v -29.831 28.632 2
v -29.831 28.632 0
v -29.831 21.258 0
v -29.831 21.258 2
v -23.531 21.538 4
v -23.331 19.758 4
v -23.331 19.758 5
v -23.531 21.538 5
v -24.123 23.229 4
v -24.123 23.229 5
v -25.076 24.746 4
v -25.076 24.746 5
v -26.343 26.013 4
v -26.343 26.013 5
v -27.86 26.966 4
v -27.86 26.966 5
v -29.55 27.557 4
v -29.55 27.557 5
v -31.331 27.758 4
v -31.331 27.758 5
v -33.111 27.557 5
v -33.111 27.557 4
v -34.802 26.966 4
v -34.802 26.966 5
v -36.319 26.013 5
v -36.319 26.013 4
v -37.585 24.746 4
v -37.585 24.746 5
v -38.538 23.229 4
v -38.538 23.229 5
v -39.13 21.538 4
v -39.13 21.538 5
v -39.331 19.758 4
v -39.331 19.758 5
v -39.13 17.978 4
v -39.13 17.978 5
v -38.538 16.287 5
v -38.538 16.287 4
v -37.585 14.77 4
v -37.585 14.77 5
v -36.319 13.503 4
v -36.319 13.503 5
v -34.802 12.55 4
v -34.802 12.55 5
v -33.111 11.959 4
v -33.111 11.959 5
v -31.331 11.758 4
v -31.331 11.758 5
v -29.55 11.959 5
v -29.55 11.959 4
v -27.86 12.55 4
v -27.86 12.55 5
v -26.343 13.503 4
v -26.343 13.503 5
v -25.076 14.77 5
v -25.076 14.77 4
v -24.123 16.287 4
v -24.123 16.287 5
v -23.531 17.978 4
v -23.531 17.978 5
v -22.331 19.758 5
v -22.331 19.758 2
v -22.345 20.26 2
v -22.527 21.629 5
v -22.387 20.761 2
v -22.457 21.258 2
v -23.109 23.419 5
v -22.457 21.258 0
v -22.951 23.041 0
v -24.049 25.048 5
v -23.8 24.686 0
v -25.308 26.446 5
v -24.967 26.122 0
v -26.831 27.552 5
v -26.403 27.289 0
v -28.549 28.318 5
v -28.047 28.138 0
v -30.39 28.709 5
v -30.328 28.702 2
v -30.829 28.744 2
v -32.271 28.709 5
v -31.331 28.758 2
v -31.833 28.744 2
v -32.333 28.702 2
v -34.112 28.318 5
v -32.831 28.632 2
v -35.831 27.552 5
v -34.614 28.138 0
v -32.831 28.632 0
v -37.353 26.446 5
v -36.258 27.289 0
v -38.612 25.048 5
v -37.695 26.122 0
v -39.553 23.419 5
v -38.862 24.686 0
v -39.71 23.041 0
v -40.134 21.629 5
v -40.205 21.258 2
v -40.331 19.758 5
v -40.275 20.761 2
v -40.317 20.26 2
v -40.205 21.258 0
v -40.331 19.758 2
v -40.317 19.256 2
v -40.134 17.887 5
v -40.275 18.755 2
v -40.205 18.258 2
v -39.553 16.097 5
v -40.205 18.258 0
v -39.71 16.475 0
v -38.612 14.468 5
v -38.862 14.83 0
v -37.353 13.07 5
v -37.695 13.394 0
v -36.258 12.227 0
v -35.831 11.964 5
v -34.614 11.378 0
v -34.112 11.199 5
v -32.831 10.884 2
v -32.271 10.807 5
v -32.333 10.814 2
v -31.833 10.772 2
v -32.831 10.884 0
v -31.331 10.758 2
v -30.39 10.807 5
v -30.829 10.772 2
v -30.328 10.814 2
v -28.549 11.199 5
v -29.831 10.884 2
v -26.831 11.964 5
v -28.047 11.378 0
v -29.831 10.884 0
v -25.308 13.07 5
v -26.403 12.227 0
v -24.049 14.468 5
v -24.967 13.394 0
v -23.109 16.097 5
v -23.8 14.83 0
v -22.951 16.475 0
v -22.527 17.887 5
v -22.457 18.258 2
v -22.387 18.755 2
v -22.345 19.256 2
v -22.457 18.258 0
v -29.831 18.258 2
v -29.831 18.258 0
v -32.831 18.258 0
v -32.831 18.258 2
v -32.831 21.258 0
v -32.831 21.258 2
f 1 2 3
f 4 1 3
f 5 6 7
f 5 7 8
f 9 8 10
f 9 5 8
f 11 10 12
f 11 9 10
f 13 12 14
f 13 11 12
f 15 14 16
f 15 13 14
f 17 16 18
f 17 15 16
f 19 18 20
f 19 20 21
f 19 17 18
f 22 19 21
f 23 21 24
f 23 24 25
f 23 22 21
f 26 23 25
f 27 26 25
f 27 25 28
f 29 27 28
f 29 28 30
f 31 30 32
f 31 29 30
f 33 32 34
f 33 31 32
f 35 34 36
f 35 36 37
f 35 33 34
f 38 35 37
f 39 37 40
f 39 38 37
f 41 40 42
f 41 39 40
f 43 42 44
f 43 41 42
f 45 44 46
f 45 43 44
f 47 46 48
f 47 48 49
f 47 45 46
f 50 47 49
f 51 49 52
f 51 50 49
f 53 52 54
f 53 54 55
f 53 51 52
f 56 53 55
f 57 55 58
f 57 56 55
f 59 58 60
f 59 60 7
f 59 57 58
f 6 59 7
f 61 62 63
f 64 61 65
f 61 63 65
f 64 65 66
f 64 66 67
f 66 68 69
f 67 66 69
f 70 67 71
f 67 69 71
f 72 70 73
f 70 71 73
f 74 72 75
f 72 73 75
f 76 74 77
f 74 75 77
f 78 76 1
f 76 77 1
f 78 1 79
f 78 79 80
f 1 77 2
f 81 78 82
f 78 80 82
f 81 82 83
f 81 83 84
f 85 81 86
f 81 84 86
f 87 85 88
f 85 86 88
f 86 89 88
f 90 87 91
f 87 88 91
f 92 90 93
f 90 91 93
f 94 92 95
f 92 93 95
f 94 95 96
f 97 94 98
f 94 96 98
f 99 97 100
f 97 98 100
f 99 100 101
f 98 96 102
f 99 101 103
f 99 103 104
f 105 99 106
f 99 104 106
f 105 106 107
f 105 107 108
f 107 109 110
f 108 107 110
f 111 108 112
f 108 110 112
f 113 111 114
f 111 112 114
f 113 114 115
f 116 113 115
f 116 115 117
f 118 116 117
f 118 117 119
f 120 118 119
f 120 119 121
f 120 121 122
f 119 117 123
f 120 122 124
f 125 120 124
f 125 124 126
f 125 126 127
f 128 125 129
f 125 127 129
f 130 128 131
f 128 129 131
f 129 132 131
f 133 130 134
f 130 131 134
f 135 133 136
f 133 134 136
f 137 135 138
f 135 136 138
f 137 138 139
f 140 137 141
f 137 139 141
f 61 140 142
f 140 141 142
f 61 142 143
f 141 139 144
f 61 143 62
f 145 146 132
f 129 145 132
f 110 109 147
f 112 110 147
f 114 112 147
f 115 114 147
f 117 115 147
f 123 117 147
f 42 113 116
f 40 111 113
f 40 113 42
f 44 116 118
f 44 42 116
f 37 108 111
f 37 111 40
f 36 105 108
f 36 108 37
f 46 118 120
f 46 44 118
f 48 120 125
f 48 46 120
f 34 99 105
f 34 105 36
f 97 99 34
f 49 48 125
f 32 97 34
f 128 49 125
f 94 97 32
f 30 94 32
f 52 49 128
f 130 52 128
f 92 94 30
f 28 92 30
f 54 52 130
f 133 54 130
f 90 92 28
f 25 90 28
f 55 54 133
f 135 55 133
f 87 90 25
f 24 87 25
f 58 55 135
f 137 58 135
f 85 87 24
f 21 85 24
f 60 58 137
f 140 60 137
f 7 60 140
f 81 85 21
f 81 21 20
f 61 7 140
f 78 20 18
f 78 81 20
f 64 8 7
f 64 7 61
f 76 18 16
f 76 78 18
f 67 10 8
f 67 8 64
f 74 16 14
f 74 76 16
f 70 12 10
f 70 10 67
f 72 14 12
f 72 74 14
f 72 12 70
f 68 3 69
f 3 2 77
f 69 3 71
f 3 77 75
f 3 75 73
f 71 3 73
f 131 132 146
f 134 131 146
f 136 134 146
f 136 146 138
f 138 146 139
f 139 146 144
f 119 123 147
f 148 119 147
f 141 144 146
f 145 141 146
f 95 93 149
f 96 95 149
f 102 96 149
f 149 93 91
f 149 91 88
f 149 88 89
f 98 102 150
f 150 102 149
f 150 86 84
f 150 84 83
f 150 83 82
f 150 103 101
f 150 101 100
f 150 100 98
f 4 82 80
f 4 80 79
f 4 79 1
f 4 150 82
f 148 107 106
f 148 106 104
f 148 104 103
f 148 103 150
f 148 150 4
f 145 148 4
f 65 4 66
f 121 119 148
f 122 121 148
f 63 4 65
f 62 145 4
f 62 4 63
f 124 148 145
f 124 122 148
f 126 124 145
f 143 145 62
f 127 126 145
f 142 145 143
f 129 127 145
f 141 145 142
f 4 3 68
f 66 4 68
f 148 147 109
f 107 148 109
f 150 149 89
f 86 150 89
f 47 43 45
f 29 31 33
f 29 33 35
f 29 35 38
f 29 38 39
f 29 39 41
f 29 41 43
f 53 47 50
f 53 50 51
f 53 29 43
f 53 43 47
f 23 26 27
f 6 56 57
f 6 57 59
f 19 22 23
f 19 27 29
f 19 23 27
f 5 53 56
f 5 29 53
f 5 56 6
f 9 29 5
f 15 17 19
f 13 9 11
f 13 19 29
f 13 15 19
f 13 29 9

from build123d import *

# Parameters (mm, degrees)
F0_R     = 9
F1_DEPTH = 4
F3_W     = 3
F3_H     = 3
F4_DEPTH = 2
F2_R     = 9
F2_R_2   = 8
F5_DEPTH = 1


# Not quite as in the source:
# - a feature names something its author has since deleted; it is built from what else it names


with BuildPart() as f1:
    # F0 (on Top) → F1 (new body)
    with BuildSketch(Plane.XY):
        with Locations((-31.3306450844, 19.7580661625)):
            Circle(F0_R)
    extrude(amount=F1_DEPTH)

    # F3 (on face) → F4 (cut)
    with BuildSketch(Plane(origin=(0, 0, 0), x_dir=(1, 0, 0), z_dir=(0, 0, -1))):
        with BuildLine():
            ThreePointArc((-32.8306450844, -28.6321858371), (-32.0832814269, -28.7265408676), (-31.3306450844, -28.7580661625))
            ThreePointArc((-31.3306450844, -28.7580661625), (-30.5780087419, -28.7265408676), (-29.8306450844, -28.6321858371))
            Line((-29.8306450844, -28.6321858371), (-29.8306450844, -21.2580661625))
            Line((-29.8306450844, -21.2580661625), (-32.8306450844, -21.2580661625))
            Line((-32.8306450844, -21.2580661625), (-32.8306450844, -28.6321858371))
        make_face()
        with BuildLine():
            ThreePointArc((-40.204764759, -18.2580661625), (-40.2991197895, -19.0054298199), (-40.3306450844, -19.7580661625))
            ThreePointArc((-40.3306450844, -19.7580661625), (-40.2991197895, -20.510702505), (-40.204764759, -21.2580661625))
            Line((-40.204764759, -21.2580661625), (-32.8306450844, -21.2580661625))
            Line((-32.8306450844, -21.2580661625), (-32.8306450844, -18.2580661625))
            Line((-32.8306450844, -18.2580661625), (-40.204764759, -18.2580661625))
        make_face()
        with Locations((-31.3306450844, -19.7580661625)):
            Rectangle(F3_W, F3_H)
        with BuildLine():
            Line((-29.8306450844, -18.2580661625), (-29.8306450844, -21.2580661625))
            Line((-29.8306450844, -21.2580661625), (-22.4565254097, -21.2580661625))
            ThreePointArc((-22.4565254097, -21.2580661625), (-22.3621703793, -20.510702505), (-22.3306450844, -19.7580661625))
            ThreePointArc((-22.3306450844, -19.7580661625), (-22.3621703793, -19.0054298199), (-22.4565254097, -18.2580661625))
            Line((-22.4565254097, -18.2580661625), (-29.8306450844, -18.2580661625))
        make_face()
        with BuildLine():
            Line((-32.8306450844, -10.8839464878), (-32.8306450844, -18.2580661625))
            Line((-32.8306450844, -18.2580661625), (-29.8306450844, -18.2580661625))
            Line((-29.8306450844, -18.2580661625), (-29.8306450844, -10.8839464878))
            ThreePointArc((-29.8306450844, -10.8839464878), (-30.5780087419, -10.7895914574), (-31.3306450844, -10.7580661625))
            ThreePointArc((-31.3306450844, -10.7580661625), (-32.0832814269, -10.7895914574), (-32.8306450844, -10.8839464878))
        make_face()
    extrude(amount=-F4_DEPTH, mode=Mode.SUBTRACT)

    # F2 (on face) → F5 (join)
    with BuildSketch(Plane.XY.offset(4)):
        with Locations((-31.3306450844, 19.7580661625)):
            Circle(F2_R)
        with Locations((-31.3306450844, 19.7580661625)):
            Circle(F2_R_2, mode=Mode.SUBTRACT)
    extrude(amount=F5_DEPTH)


solid = f1.part
